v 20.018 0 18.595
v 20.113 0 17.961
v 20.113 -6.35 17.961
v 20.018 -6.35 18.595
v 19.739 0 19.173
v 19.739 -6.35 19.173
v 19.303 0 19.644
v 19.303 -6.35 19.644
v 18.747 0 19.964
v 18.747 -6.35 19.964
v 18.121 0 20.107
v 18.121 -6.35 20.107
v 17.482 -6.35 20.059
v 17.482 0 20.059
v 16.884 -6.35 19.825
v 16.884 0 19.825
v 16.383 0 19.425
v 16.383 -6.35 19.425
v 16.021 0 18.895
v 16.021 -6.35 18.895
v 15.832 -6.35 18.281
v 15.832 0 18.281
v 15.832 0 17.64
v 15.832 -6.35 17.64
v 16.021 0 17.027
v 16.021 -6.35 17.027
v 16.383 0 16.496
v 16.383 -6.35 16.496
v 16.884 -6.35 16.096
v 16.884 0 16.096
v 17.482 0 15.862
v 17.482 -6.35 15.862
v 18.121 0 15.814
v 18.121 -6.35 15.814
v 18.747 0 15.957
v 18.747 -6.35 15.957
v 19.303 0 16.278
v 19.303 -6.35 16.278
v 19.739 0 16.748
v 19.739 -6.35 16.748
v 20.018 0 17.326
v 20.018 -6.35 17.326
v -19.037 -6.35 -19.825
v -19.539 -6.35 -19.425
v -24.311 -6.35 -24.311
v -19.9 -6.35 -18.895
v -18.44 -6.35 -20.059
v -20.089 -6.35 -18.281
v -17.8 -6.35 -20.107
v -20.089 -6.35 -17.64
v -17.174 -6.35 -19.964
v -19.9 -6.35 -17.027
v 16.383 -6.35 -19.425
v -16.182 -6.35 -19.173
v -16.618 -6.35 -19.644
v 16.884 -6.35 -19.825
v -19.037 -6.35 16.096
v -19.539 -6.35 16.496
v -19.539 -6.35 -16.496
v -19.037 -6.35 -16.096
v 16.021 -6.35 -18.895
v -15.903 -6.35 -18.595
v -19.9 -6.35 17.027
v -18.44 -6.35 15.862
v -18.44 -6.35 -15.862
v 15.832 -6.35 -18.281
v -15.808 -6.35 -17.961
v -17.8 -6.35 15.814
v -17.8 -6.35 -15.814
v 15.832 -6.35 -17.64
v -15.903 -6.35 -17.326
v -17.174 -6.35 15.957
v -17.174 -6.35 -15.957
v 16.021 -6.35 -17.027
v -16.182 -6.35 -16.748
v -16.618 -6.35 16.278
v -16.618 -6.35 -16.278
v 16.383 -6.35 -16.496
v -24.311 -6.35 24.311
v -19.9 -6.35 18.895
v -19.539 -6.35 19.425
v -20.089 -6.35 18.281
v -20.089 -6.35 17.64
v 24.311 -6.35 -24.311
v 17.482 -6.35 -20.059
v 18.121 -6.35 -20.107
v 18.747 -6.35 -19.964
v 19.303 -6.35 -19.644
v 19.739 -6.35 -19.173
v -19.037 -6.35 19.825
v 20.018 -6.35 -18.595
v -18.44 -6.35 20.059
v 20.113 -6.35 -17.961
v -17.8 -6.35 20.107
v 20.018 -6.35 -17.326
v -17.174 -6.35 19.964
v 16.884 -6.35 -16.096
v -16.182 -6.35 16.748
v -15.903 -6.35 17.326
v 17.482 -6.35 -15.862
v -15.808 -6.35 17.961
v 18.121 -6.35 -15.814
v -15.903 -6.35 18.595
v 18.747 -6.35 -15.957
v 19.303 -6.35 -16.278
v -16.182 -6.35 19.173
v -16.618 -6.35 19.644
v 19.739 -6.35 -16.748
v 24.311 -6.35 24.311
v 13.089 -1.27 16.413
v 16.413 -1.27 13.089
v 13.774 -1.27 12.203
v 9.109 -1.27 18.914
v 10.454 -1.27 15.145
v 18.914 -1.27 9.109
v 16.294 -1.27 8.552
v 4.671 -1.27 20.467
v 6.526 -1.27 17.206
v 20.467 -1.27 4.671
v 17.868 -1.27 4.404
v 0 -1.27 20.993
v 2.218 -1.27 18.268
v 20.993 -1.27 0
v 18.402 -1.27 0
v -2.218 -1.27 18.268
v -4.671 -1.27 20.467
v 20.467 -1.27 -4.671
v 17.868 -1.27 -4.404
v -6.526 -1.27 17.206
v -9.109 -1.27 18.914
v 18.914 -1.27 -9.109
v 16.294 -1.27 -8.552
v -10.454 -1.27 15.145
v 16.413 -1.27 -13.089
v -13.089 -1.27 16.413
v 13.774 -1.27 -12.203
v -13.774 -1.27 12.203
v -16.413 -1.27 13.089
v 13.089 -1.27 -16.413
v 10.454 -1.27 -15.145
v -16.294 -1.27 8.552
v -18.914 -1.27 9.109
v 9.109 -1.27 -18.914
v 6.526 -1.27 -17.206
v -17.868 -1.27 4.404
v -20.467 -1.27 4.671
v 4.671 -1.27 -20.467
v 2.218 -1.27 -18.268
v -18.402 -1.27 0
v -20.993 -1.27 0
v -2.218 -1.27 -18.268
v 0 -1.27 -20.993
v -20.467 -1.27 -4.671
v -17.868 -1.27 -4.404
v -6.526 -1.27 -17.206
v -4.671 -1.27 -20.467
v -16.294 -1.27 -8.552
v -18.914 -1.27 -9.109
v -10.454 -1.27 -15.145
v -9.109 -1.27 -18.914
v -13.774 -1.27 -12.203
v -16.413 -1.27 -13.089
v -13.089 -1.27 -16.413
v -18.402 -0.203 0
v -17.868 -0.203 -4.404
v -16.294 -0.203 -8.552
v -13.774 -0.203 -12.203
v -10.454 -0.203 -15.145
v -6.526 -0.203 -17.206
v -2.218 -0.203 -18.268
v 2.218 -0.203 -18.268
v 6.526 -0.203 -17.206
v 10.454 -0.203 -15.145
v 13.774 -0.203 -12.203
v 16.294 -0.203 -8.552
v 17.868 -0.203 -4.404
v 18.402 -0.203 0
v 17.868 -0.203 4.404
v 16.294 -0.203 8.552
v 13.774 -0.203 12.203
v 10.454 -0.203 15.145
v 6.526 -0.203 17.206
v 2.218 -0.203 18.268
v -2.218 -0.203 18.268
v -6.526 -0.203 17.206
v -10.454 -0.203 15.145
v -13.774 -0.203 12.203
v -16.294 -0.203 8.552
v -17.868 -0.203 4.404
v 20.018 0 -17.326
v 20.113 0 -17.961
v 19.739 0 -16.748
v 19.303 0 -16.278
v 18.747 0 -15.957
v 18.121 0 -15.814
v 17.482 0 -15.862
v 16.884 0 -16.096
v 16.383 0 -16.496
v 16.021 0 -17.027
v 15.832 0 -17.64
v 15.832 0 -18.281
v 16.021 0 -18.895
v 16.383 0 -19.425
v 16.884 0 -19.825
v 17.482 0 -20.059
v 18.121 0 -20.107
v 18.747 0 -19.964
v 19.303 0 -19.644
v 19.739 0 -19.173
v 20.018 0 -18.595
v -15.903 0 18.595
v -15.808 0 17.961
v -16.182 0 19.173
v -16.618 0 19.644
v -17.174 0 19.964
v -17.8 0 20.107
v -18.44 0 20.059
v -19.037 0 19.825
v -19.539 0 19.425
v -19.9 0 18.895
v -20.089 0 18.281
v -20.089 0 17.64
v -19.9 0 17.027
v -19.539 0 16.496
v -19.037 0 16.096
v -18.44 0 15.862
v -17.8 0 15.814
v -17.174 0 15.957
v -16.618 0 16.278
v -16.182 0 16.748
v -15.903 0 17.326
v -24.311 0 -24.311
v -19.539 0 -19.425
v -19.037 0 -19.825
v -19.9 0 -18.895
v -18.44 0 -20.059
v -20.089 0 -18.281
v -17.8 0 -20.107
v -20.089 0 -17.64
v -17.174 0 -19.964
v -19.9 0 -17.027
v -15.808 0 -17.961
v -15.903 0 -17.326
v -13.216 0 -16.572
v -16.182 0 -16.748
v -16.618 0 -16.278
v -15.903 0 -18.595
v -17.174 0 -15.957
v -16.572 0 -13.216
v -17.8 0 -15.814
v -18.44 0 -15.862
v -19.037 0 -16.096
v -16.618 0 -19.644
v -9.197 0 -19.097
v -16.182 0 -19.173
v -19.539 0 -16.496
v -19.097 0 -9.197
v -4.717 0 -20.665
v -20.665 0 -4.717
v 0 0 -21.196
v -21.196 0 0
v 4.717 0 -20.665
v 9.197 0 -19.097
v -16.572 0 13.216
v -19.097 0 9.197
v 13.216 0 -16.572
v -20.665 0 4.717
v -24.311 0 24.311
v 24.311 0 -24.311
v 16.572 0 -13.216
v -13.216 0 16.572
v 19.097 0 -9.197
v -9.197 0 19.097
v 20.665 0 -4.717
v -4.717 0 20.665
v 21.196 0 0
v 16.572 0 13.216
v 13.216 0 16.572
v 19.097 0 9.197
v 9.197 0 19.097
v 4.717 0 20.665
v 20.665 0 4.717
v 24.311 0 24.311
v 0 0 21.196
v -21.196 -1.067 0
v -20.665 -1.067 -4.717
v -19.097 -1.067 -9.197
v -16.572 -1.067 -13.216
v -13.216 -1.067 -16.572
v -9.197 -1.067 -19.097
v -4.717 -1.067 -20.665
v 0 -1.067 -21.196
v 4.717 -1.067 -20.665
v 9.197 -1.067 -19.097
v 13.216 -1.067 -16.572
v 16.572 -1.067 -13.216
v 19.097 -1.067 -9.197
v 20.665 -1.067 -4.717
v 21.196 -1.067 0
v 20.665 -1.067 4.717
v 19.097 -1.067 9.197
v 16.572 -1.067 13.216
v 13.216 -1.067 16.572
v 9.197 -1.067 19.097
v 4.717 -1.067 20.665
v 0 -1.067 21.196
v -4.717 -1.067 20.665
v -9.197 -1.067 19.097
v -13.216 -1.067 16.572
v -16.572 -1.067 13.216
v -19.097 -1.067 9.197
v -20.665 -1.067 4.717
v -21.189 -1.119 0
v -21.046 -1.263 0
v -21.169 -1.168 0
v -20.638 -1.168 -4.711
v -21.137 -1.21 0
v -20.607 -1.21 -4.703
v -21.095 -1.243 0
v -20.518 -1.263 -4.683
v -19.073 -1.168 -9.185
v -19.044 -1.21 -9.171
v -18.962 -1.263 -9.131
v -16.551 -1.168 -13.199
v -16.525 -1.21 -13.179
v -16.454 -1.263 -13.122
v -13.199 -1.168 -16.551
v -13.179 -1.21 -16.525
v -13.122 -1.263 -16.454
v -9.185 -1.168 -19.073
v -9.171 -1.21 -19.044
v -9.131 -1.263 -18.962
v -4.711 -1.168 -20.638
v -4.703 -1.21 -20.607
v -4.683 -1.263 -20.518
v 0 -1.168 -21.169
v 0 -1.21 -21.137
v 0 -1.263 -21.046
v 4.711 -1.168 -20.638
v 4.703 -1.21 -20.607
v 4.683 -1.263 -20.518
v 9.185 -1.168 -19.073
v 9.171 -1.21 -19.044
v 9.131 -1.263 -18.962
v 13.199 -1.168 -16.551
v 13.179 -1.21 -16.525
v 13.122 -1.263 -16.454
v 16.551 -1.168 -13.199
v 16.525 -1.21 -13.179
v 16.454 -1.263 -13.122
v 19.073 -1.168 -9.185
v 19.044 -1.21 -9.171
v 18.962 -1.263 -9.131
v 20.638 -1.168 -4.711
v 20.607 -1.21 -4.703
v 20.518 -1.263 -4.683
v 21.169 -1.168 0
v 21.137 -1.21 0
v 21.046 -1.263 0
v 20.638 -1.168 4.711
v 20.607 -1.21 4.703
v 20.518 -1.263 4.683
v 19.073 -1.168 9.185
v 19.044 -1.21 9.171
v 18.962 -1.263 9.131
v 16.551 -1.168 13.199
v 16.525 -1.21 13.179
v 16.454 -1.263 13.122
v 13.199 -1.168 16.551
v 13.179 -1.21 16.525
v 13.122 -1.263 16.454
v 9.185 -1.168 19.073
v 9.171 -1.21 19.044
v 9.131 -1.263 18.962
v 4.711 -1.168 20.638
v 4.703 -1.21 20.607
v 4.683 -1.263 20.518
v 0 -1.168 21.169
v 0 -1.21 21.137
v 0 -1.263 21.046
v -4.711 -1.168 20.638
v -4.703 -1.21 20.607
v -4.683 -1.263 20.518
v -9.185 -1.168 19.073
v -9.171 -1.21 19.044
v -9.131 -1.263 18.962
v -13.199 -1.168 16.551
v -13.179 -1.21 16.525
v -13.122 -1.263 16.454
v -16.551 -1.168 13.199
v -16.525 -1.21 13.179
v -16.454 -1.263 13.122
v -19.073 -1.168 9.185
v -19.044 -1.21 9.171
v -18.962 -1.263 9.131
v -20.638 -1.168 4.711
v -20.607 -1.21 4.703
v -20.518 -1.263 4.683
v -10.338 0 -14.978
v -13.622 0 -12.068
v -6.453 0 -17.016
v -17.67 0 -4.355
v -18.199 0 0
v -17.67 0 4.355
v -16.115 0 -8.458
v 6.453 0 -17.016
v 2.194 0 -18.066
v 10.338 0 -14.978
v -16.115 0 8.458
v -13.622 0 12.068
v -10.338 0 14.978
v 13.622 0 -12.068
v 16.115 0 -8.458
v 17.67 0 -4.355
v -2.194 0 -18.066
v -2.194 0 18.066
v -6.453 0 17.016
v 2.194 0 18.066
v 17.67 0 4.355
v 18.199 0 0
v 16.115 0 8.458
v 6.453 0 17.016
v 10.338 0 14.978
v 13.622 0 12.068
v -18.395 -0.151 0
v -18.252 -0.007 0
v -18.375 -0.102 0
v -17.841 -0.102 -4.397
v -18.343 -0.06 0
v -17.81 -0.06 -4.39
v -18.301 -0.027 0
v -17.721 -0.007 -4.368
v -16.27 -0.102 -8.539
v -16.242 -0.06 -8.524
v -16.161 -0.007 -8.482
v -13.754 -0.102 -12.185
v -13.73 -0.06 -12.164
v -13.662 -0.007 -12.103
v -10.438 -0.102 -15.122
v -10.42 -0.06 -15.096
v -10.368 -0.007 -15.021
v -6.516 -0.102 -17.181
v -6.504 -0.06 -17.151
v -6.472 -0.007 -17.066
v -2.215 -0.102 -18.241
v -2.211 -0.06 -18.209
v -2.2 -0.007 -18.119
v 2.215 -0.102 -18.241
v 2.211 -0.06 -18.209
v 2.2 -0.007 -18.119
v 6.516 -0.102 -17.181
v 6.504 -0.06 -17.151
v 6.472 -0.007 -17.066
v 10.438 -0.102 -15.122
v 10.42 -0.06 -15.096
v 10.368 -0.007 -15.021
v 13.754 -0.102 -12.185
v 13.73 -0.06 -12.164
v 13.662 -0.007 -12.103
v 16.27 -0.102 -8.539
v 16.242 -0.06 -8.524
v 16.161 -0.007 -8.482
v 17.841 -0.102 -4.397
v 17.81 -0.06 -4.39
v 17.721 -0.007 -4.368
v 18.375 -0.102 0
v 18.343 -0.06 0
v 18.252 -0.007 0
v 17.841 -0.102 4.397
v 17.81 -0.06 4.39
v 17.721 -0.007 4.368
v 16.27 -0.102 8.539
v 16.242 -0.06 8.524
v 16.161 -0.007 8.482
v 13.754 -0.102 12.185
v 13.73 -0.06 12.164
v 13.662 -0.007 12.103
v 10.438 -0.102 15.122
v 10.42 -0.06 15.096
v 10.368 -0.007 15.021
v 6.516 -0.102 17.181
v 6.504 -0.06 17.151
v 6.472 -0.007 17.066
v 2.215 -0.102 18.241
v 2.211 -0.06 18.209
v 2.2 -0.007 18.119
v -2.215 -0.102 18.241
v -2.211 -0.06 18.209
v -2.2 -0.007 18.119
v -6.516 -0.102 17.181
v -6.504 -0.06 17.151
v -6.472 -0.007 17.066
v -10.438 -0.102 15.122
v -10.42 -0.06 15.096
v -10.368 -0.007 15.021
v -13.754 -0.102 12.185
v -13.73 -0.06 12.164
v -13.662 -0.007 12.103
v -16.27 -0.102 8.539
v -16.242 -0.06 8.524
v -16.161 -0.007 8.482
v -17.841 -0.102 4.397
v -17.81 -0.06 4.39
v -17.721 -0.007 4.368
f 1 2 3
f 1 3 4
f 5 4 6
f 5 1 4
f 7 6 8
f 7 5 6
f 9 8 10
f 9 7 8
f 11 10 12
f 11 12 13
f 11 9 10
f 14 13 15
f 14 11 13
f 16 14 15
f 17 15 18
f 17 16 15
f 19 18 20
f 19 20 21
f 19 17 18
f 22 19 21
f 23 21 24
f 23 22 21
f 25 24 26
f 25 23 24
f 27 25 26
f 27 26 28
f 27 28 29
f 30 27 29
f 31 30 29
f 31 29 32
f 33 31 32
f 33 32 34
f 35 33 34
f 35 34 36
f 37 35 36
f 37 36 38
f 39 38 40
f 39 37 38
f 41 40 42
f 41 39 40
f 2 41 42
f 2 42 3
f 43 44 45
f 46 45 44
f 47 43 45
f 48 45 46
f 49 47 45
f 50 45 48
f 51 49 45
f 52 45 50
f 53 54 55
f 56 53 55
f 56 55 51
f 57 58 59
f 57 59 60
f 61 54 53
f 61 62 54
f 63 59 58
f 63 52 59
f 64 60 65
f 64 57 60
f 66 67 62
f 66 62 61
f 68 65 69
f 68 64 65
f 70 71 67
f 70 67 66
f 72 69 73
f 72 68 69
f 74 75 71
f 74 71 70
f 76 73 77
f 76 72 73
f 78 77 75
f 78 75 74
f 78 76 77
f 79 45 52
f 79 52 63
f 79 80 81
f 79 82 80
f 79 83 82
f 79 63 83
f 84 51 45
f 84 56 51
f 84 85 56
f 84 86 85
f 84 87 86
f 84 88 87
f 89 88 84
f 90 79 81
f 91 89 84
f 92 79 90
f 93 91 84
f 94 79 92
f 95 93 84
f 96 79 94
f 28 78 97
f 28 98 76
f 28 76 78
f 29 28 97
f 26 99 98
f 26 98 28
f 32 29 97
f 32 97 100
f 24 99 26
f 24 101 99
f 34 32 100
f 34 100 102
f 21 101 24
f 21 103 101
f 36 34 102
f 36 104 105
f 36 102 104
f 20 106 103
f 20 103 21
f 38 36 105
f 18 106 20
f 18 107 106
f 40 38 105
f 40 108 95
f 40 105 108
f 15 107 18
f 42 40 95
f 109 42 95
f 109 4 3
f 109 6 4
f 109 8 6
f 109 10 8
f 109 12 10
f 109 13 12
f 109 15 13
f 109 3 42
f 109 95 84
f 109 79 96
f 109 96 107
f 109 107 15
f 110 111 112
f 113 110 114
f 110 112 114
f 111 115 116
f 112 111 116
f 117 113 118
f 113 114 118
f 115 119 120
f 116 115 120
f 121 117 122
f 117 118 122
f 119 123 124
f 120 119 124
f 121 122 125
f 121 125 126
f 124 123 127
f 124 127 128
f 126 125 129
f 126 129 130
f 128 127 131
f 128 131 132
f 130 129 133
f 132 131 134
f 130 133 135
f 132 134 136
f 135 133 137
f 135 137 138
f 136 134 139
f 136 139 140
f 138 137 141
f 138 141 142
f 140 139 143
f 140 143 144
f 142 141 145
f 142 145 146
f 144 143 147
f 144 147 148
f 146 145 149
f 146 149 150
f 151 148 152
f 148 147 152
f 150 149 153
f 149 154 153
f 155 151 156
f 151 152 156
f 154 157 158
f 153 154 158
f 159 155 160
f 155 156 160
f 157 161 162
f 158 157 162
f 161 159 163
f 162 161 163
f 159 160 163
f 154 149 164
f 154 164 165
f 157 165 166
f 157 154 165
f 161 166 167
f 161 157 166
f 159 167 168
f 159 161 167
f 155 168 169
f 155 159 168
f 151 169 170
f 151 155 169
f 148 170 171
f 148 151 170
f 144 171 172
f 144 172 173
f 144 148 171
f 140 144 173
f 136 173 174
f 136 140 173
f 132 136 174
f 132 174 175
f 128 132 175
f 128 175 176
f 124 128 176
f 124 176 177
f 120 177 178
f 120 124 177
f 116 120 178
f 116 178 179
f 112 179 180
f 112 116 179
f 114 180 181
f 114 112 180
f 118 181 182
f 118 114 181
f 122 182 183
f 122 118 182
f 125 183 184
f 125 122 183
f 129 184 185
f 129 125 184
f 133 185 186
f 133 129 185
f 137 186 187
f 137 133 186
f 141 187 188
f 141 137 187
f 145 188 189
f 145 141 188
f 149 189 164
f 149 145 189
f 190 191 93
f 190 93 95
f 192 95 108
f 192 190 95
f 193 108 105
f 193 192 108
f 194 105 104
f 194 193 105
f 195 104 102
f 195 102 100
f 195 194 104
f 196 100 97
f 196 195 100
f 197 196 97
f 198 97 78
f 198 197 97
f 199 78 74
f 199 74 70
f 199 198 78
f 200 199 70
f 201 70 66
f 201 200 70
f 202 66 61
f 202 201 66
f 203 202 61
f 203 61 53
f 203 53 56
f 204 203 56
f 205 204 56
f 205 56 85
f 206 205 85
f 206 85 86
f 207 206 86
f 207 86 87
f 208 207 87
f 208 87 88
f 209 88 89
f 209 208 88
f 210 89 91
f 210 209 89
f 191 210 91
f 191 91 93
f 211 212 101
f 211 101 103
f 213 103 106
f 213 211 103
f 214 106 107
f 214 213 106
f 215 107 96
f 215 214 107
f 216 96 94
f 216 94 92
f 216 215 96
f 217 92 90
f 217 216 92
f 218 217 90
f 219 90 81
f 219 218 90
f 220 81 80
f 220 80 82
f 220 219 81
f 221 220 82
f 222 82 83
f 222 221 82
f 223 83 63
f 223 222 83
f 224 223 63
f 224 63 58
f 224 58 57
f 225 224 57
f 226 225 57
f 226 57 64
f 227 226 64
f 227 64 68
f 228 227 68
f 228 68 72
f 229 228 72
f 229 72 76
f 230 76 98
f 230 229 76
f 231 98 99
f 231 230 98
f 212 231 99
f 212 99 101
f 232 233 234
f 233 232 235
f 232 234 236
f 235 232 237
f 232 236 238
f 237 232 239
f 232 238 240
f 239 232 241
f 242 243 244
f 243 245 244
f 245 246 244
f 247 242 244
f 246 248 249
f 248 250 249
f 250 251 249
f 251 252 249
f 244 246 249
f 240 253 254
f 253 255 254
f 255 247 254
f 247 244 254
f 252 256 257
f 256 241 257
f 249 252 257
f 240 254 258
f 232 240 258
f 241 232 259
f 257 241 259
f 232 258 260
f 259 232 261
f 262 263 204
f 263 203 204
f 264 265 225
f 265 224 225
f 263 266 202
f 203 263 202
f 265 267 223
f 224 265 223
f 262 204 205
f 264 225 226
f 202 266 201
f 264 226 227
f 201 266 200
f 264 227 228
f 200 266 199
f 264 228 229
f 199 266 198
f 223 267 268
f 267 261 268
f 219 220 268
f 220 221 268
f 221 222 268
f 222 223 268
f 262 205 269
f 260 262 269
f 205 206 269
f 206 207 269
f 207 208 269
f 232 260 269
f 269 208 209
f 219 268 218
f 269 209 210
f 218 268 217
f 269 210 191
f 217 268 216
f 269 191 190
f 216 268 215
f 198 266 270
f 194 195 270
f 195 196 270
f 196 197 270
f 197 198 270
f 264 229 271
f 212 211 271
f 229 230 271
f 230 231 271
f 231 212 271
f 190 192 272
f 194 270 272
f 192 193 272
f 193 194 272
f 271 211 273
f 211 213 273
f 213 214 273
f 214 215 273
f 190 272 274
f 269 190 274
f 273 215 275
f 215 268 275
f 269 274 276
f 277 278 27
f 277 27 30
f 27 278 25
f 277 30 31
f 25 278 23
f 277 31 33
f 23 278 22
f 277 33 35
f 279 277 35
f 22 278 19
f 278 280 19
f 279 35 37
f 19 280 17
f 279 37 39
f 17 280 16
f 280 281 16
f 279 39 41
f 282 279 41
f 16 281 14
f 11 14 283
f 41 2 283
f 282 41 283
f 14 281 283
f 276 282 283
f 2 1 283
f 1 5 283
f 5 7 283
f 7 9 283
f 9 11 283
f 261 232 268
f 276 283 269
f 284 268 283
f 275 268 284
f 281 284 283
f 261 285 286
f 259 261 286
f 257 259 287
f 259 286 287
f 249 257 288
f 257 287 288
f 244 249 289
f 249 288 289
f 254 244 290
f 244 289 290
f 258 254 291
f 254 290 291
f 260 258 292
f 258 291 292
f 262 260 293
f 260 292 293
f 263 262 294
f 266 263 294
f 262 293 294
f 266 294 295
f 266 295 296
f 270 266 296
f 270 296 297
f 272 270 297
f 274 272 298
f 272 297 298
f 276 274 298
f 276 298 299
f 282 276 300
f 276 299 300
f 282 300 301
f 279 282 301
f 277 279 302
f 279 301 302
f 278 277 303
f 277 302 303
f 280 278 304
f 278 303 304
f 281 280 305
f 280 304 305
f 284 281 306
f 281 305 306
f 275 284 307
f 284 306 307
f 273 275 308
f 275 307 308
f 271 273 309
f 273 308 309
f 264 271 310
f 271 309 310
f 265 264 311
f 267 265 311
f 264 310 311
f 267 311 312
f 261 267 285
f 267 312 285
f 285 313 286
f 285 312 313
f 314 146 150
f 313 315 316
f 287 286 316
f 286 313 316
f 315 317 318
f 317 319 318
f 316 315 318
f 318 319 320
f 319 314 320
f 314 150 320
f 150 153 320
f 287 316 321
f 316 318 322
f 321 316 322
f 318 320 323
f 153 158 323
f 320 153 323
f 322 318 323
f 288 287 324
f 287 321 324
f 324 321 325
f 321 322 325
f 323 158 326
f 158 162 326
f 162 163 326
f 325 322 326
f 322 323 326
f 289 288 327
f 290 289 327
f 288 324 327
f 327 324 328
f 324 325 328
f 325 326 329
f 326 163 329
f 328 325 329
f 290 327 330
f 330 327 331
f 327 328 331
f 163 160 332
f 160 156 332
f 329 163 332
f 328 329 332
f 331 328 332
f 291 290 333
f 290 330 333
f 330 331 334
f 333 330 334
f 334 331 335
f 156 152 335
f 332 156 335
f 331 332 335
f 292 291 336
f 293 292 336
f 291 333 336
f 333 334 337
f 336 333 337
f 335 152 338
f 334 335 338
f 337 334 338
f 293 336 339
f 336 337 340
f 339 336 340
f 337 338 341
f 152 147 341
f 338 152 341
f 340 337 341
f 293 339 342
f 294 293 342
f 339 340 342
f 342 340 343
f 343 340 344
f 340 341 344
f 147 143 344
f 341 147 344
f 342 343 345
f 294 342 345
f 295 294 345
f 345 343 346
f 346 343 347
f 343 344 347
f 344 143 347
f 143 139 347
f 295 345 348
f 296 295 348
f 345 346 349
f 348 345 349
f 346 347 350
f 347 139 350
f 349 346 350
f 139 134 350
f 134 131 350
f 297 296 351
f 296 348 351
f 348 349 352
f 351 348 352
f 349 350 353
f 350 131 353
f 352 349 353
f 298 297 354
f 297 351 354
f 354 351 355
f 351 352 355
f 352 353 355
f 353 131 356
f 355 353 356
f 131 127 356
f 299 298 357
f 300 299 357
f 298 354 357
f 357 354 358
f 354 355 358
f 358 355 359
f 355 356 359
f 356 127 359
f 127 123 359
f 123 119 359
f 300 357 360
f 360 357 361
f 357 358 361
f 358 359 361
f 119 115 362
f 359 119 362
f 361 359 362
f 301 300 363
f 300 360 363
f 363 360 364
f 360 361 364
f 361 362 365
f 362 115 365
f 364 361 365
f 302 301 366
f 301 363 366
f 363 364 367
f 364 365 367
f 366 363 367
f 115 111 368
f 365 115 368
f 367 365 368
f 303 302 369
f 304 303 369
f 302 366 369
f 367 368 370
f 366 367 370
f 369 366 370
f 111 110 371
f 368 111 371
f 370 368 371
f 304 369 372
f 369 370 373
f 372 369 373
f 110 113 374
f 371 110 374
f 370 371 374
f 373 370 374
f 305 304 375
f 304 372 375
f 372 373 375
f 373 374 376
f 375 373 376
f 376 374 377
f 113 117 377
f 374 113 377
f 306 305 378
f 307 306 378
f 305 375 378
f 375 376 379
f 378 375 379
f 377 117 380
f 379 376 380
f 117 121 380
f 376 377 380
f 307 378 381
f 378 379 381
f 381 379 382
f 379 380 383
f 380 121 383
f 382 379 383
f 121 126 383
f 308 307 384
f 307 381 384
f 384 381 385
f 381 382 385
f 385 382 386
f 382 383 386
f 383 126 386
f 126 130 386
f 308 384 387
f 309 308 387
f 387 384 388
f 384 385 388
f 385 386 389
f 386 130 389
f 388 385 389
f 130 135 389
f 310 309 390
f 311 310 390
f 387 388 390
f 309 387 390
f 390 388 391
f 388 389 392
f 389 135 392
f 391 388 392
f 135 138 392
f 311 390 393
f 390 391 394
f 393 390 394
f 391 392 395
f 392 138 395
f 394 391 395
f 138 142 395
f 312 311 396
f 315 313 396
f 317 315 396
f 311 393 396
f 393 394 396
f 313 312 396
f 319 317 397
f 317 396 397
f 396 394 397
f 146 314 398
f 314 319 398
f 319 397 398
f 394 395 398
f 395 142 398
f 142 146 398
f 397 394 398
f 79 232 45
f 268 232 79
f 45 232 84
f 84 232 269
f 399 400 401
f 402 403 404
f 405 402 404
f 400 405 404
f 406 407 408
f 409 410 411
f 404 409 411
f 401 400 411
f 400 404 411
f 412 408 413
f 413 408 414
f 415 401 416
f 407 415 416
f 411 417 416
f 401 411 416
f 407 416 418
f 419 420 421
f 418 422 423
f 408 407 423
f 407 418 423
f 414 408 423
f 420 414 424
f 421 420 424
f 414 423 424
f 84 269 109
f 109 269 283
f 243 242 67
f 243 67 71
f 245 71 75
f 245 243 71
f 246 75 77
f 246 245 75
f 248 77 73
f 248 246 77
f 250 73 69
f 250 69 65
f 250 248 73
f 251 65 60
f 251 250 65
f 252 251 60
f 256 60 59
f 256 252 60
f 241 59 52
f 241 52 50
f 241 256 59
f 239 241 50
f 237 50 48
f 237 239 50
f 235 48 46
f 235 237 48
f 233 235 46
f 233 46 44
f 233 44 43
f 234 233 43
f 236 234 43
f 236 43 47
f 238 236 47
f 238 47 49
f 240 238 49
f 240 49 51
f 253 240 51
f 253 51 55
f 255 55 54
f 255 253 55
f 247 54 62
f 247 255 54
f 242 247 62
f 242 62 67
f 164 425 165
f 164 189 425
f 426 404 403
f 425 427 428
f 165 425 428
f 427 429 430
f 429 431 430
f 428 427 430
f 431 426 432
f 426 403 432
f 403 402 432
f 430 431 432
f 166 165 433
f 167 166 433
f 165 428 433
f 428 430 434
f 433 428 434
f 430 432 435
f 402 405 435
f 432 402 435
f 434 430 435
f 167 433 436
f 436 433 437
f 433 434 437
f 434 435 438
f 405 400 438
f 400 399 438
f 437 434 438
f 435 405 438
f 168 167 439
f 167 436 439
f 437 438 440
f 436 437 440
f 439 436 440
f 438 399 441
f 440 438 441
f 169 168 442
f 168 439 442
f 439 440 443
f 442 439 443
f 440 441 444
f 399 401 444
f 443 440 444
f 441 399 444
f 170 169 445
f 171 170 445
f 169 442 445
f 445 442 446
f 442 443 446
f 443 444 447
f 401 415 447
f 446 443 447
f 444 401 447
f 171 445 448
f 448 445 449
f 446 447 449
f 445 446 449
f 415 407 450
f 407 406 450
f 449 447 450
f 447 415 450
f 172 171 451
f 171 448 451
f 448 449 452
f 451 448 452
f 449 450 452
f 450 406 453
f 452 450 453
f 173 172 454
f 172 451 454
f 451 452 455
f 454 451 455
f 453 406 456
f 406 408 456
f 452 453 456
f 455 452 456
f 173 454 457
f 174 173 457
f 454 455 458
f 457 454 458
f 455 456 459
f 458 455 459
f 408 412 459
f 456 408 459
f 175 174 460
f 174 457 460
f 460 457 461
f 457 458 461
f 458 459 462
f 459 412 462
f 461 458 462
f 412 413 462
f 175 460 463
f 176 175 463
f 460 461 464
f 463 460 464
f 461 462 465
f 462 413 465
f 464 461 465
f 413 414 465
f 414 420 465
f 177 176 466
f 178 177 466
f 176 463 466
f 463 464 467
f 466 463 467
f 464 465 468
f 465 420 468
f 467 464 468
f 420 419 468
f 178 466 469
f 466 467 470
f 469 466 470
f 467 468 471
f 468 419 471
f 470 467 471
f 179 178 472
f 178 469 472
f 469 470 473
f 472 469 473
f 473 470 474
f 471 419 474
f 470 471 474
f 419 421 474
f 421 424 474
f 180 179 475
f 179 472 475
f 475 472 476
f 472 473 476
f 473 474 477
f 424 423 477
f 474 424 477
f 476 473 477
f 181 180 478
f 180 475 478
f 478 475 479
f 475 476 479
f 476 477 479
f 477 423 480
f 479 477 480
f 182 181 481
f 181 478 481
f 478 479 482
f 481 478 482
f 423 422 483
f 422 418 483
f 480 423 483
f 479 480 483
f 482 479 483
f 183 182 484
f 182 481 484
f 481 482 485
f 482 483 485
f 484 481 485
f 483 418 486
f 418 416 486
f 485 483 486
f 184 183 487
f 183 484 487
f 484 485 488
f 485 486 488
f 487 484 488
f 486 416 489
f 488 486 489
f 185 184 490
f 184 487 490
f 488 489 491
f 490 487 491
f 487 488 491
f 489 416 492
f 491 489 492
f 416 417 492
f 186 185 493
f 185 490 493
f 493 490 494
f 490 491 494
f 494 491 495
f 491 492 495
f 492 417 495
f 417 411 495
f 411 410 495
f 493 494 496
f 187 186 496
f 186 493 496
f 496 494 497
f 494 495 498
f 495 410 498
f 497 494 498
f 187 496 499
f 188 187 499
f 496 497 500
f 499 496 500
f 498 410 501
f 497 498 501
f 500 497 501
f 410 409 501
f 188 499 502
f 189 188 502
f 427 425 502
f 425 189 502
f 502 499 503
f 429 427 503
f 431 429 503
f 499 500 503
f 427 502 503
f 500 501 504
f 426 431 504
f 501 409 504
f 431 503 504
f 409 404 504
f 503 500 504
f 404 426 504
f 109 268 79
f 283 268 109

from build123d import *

# Parameters (mm, degrees)
F0_W     = 48.6210244843
F0_H     = 48.6210244843
F0_R     = 2.15265
F1_DEPTH = 6.35
F6_W     = 2.794
F6_H     = 1.27
F8_R     = 0.2032


with BuildPart() as f1:
    # F0 (on Front) → F1 (new body)
    with BuildSketch(Plane.XZ):
        Rectangle(F0_W, F0_H)
        with Locations((-17.9605122421, -17.9605122421)):
            Circle(F0_R, mode=Mode.SUBTRACT)
        with Locations((17.9605122421, -17.9605122421)):
            Circle(F0_R, mode=Mode.SUBTRACT)
        with Locations((-17.9605122421, 17.9605122421)):
            Circle(F0_R, mode=Mode.SUBTRACT)
        with Locations((17.9605122421, 17.9605122421)):
            Circle(F0_R, mode=Mode.SUBTRACT)
    extrude(amount=F1_DEPTH)

    # F6 (on 3pt) → F7 (revolve, cut)
    with BuildSketch(Plane(origin=(0, 0, 0), x_dir=(1, 0, 0), z_dir=(0, 0, -1))):
        with Locations((-19.7993, 0.635)):
            Rectangle(F6_W, F6_H)
    revolve(axis=Axis((0, 0.4501026124, 0), (0, -1, 0)), mode=Mode.SUBTRACT)

    # F8
    f8_edges = [f1.edges().sort_by_distance(p)[0] for p in [
        (21.1963, -1.27, 0),
        (18.4023, 0, 0),
    ]]
    fillet(f8_edges, radius=F8_R)


solid = f1.part
